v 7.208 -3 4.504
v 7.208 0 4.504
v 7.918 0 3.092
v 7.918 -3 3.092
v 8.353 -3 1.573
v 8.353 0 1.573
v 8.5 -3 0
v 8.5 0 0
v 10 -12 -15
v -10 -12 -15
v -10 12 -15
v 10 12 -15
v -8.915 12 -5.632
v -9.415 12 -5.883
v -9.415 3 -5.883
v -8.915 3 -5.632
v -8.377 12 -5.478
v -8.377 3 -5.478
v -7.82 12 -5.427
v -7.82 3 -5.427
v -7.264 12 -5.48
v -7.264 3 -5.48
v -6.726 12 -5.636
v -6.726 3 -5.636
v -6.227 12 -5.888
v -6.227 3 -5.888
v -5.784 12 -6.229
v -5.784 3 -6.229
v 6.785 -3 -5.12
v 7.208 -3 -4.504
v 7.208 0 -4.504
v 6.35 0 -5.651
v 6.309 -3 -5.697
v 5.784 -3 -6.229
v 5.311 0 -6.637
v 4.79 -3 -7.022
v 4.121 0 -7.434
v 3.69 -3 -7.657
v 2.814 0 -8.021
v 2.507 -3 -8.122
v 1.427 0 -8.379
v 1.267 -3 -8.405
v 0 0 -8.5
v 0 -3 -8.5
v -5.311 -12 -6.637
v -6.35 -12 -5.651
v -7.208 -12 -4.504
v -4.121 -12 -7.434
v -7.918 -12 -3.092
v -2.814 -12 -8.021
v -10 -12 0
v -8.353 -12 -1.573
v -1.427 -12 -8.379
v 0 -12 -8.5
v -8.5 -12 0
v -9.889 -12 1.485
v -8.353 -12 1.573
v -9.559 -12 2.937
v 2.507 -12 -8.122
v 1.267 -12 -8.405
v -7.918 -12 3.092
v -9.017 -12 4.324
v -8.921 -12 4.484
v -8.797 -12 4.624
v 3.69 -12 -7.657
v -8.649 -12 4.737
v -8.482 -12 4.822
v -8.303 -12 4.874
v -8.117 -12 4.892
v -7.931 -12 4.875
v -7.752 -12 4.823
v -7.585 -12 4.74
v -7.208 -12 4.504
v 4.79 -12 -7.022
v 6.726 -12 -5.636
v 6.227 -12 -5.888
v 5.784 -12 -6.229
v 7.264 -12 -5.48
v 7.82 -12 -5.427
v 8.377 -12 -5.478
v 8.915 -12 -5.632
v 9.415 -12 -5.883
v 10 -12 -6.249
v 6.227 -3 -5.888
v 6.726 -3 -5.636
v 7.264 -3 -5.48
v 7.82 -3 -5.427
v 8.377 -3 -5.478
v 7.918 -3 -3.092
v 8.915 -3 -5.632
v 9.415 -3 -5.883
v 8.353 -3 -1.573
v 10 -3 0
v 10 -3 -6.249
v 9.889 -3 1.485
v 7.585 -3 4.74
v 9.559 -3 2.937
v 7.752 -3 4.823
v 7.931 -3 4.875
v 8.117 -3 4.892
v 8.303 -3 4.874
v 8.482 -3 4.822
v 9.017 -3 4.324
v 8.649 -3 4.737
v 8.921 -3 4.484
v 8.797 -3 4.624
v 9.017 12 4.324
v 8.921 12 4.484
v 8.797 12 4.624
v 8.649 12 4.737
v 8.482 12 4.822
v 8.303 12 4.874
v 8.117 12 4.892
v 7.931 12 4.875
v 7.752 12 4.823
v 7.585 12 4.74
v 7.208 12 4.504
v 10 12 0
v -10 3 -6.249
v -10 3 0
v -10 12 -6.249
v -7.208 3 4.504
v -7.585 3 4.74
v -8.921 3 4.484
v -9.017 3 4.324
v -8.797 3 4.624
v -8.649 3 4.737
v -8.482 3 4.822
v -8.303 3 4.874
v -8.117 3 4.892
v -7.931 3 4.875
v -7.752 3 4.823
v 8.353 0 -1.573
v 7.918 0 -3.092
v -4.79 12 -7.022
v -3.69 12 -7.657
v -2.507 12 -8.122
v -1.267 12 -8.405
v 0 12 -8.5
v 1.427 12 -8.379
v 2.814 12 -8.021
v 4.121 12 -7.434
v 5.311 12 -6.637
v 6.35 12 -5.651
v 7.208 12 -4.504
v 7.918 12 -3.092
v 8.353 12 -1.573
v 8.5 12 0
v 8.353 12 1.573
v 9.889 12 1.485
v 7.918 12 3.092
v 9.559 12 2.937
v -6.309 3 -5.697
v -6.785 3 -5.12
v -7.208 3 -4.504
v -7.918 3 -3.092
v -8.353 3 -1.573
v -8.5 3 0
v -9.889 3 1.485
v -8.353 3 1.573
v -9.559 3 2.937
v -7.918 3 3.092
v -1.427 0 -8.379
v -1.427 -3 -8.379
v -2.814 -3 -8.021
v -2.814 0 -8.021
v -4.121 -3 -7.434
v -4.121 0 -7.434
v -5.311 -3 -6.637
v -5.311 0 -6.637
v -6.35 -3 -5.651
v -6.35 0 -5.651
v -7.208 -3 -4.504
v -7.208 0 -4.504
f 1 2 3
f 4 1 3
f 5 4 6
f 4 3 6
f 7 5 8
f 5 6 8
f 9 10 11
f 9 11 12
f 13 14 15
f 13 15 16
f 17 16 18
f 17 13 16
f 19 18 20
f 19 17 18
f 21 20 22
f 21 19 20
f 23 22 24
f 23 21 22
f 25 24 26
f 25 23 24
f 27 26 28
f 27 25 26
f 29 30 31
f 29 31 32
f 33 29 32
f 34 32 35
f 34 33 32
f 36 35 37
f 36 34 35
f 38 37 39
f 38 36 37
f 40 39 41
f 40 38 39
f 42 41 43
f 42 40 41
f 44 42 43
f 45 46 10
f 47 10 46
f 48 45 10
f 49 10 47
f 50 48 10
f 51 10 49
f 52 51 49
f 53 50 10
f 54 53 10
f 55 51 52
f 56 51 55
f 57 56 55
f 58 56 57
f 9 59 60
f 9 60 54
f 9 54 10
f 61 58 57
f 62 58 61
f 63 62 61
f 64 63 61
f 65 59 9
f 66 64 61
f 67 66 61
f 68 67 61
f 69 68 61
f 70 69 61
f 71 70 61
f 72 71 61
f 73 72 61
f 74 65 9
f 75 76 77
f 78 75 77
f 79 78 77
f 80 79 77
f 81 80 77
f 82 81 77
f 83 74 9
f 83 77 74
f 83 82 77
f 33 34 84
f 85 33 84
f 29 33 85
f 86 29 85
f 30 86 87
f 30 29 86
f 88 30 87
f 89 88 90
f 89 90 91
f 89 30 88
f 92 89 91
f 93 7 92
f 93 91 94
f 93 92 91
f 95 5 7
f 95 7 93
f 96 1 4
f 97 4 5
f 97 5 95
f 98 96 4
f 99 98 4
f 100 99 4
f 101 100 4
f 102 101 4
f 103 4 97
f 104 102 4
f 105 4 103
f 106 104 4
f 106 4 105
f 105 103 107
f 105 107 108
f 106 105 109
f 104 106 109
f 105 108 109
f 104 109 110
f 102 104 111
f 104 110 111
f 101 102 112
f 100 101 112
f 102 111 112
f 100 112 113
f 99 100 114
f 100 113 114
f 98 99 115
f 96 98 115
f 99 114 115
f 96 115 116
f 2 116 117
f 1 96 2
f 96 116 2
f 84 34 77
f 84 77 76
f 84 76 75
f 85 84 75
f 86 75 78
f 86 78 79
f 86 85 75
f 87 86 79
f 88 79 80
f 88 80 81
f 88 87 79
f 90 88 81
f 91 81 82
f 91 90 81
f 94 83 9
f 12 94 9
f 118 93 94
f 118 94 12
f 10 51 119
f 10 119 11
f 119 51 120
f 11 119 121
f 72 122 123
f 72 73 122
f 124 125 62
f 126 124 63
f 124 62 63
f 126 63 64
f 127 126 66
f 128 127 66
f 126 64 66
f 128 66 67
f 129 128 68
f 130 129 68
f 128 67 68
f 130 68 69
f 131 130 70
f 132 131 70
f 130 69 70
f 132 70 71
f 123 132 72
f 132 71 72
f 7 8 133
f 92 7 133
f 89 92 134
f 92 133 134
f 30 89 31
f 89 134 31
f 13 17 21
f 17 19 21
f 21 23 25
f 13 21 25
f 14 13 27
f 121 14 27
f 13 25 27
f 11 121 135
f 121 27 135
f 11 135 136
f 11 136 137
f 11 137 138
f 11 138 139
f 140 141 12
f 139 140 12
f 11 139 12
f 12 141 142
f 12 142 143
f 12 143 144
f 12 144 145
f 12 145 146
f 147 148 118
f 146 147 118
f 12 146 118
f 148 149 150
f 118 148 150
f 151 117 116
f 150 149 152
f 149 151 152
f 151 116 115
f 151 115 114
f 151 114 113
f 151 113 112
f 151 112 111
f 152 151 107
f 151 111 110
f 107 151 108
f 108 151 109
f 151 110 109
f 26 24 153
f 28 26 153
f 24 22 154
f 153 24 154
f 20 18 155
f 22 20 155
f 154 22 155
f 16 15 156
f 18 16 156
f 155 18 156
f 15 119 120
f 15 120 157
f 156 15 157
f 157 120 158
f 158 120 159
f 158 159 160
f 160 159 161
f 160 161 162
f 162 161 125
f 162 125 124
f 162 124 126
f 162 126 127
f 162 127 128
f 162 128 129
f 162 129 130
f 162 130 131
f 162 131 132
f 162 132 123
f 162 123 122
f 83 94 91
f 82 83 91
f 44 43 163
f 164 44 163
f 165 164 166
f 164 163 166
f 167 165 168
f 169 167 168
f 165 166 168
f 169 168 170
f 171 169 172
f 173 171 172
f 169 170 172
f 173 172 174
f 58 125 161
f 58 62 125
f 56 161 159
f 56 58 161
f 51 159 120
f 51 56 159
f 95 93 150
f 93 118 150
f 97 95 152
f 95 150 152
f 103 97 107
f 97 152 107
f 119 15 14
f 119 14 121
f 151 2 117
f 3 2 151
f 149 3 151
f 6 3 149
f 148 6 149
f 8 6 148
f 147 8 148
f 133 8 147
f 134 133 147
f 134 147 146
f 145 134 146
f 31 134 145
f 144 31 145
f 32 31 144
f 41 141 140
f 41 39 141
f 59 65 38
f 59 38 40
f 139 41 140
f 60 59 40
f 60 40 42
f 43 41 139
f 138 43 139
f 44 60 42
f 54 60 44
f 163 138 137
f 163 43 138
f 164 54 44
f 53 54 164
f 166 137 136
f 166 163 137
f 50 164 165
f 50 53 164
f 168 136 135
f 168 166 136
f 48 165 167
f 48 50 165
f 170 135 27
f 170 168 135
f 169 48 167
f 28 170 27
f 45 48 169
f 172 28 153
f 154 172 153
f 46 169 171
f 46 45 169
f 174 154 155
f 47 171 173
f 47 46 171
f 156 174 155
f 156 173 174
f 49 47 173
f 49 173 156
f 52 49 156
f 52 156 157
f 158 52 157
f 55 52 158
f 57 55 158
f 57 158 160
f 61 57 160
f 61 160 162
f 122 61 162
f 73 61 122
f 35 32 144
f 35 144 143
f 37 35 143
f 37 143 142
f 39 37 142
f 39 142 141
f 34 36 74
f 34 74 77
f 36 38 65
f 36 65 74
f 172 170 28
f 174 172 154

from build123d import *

# Parameters (mm, degrees)
F1_DEPTH      = 12
F1_DEPTH_BACK = 3
F2_DEPTH      = 12
F2_DEPTH_BACK = 3
F3_T1_DEPTH   = 15.504504139
F3_T3_DEPTH   = 15.504504139
F4_R          = 1
F5_DEPTH      = 5


# Not quite as in the source:
# - a fillet or chamfer that OpenCascade refuses, or shapes differently, is made with other operations: its cross-section is extruded or revolved along the edge and cut away or added


with BuildPart() as f1:
    # F0 (on Front) → F1 (new body, two sides)
    with BuildSketch(Plane.XZ) as f1_sk:
        with BuildLine():
            Line((10, -6.2486935191), (8.4804809616, -5.2991926423))
            ThreePointArc((8.4804809616, -5.2991926423), (4.8480962025, -8.7461970714), (0, -10))
            Line((0, -10), (10, -10))
            Line((10, -10), (10, -6.2486935191))
        make_face()
        with BuildLine():
            Line((-10, -10), (0, -10))
            ThreePointArc((0, -10), (-4.8480962025, -8.7461970714), (-8.4804809616, -5.2991926423))
            Line((-8.4804809616, -5.2991926423), (-10, -6.2486935191))
            Line((-10, -6.2486935191), (-10, -10))
        make_face()
        with BuildLine():
            Line((8.4804809616, -5.2991926423), (7.2084088173, -4.504313746))
            ThreePointArc((7.2084088173, -4.504313746), (4.1208817721, -7.4342675107), (0, -8.5))
            Line((0, -8.5), (0, -10))
            ThreePointArc((0, -10), (4.8480962025, -8.7461970714), (8.4804809616, -5.2991926423))
        make_face()
        with BuildLine():
            Line((0, -10), (0, -8.5))
            ThreePointArc((0, -8.5), (-4.1208817721, -7.4342675107), (-7.2084088173, -4.504313746))
            Line((-7.2084088173, -4.504313746), (-8.4804809616, -5.2991926423))
            ThreePointArc((-8.4804809616, -5.2991926423), (-4.8480962025, -8.7461970714), (0, -10))
        make_face()
        with BuildLine():
            ThreePointArc((-7.2084088173, -4.504313746), (-8.5, 0), (-7.2084088173, 4.504313746))
            Line((-7.2084088173, 4.504313746), (-8.4804809616, 5.2991926423))
            ThreePointArc((-8.4804809616, 5.2991926423), (-9.6126169594, 2.7563735582), (-10, 0))
            ThreePointArc((-10, 0), (-9.6126169594, -2.7563735582), (-8.4804809616, -5.2991926423))
            Line((-8.4804809616, -5.2991926423), (-7.2084088173, -4.504313746))
        make_face()
        with BuildLine():
            Line((-10, -6.2486935191), (-8.4804809616, -5.2991926423))
            ThreePointArc((-8.4804809616, -5.2991926423), (-9.6126169594, -2.7563735582), (-10, 0))
            Line((-10, 0), (-10, -6.2486935191))
        make_face()
    extrude(amount=F1_DEPTH)
    extrude(f1_sk.sketch, amount=-F1_DEPTH_BACK)

    # F0 (on Front) → F2 (join, two sides)
    with BuildSketch(Plane.XZ) as f2_sk:
        with BuildLine():
            Line((-10, -10), (0, -10))
            ThreePointArc((0, -10), (-4.8480962025, -8.7461970714), (-8.4804809616, -5.2991926423))
            Line((-8.4804809616, -5.2991926423), (-10, -6.2486935191))
            Line((-10, -6.2486935191), (-10, -10))
        make_face()
        with BuildLine():
            Line((8.4804809616, -5.2991926423), (7.2084088173, -4.504313746))
            ThreePointArc((7.2084088173, -4.504313746), (4.1208817721, -7.4342675107), (0, -8.5))
            Line((0, -8.5), (0, -10))
            ThreePointArc((0, -10), (4.8480962025, -8.7461970714), (8.4804809616, -5.2991926423))
        make_face()
        with BuildLine():
            Line((0, -10), (0, -8.5))
            ThreePointArc((0, -8.5), (-4.1208817721, -7.4342675107), (-7.2084088173, -4.504313746))
            Line((-7.2084088173, -4.504313746), (-8.4804809616, -5.2991926423))
            ThreePointArc((-8.4804809616, -5.2991926423), (-4.8480962025, -8.7461970714), (0, -10))
        make_face()
        with BuildLine():
            Line((10, -6.2486935191), (8.4804809616, -5.2991926423))
            ThreePointArc((8.4804809616, -5.2991926423), (4.8480962025, -8.7461970714), (0, -10))
            Line((0, -10), (10, -10))
            Line((10, -10), (10, -6.2486935191))
        make_face()
        with BuildLine():
            ThreePointArc((7.2084088173, 4.504313746), (8.1707244155, 2.3429175244), (8.5, 0))
            ThreePointArc((8.5, 0), (8.1707244155, -2.3429175244), (7.2084088173, -4.504313746))
            Line((7.2084088173, -4.504313746), (8.4804809616, -5.2991926423))
            ThreePointArc((8.4804809616, -5.2991926423), (9.6126169594, -2.7563735582), (10, 0))
            ThreePointArc((10, 0), (9.6126169594, 2.7563735582), (8.4804809616, 5.2991926423))
            Line((8.4804809616, 5.2991926423), (7.2084088173, 4.504313746))
        make_face()
        with BuildLine():
            ThreePointArc((10, 0), (9.6126169594, -2.7563735582), (8.4804809616, -5.2991926423))
            Line((8.4804809616, -5.2991926423), (10, -6.2486935191))
            Line((10, -6.2486935191), (10, 0))
        make_face()
    extrude(amount=-F2_DEPTH)
    extrude(f2_sk.sketch, amount=F2_DEPTH_BACK)

    # F3: fillet of radius 3 on 2 edges, made by hand

    # F3_s2 → F3_t1 (cut)
    with BuildSketch(Plane.XZ.offset(-18.504504139)):
        with BuildLine():
            ThreePointArc((-9.4148617579, -5.883058565), (-7.5407373956, -5.4407106546), (-5.783772496, -6.2288021091))
            ThreePointArc((-5.783772496, -6.2288021091), (-6.5530648439, -5.413625509), (-7.2084088173, -4.504313746))
            Line((-7.2084088173, -4.504313746), (-9.4148617579, -5.883058565))
        make_face()
    extrude(amount=F3_T1_DEPTH, mode=Mode.SUBTRACT)

    # F3_s4 → F3_t3 (cut)
    with BuildSketch(Plane.XZ.offset(3)):
        with BuildLine():
            ThreePointArc((5.783772496, -6.2288021091), (7.5407373956, -5.4407106546), (9.4148617579, -5.883058565))
            Line((9.4148617579, -5.883058565), (7.2084088173, -4.504313746))
            ThreePointArc((7.2084088173, -4.504313746), (6.5530648439, -5.413625509), (5.783772496, -6.2288021091))
        make_face()
    extrude(amount=F3_T3_DEPTH, mode=Mode.SUBTRACT)

    # F4
    f4_edges = [f1.edges().sort_by_distance(p)[0] for p in [
        (8.480481, 4.5, 5.299193),
        (-8.480481, -4.5, 5.299193),
    ]]
    fillet(f4_edges, radius=F4_R)

    # F5 (add): a face of the model
    f5_faces = [f1.faces().sort_by_distance(p)[0] for p in [
        (0, 0, -10),
    ]]
    extrude(f5_faces, amount=F5_DEPTH)


solid = f1.part
